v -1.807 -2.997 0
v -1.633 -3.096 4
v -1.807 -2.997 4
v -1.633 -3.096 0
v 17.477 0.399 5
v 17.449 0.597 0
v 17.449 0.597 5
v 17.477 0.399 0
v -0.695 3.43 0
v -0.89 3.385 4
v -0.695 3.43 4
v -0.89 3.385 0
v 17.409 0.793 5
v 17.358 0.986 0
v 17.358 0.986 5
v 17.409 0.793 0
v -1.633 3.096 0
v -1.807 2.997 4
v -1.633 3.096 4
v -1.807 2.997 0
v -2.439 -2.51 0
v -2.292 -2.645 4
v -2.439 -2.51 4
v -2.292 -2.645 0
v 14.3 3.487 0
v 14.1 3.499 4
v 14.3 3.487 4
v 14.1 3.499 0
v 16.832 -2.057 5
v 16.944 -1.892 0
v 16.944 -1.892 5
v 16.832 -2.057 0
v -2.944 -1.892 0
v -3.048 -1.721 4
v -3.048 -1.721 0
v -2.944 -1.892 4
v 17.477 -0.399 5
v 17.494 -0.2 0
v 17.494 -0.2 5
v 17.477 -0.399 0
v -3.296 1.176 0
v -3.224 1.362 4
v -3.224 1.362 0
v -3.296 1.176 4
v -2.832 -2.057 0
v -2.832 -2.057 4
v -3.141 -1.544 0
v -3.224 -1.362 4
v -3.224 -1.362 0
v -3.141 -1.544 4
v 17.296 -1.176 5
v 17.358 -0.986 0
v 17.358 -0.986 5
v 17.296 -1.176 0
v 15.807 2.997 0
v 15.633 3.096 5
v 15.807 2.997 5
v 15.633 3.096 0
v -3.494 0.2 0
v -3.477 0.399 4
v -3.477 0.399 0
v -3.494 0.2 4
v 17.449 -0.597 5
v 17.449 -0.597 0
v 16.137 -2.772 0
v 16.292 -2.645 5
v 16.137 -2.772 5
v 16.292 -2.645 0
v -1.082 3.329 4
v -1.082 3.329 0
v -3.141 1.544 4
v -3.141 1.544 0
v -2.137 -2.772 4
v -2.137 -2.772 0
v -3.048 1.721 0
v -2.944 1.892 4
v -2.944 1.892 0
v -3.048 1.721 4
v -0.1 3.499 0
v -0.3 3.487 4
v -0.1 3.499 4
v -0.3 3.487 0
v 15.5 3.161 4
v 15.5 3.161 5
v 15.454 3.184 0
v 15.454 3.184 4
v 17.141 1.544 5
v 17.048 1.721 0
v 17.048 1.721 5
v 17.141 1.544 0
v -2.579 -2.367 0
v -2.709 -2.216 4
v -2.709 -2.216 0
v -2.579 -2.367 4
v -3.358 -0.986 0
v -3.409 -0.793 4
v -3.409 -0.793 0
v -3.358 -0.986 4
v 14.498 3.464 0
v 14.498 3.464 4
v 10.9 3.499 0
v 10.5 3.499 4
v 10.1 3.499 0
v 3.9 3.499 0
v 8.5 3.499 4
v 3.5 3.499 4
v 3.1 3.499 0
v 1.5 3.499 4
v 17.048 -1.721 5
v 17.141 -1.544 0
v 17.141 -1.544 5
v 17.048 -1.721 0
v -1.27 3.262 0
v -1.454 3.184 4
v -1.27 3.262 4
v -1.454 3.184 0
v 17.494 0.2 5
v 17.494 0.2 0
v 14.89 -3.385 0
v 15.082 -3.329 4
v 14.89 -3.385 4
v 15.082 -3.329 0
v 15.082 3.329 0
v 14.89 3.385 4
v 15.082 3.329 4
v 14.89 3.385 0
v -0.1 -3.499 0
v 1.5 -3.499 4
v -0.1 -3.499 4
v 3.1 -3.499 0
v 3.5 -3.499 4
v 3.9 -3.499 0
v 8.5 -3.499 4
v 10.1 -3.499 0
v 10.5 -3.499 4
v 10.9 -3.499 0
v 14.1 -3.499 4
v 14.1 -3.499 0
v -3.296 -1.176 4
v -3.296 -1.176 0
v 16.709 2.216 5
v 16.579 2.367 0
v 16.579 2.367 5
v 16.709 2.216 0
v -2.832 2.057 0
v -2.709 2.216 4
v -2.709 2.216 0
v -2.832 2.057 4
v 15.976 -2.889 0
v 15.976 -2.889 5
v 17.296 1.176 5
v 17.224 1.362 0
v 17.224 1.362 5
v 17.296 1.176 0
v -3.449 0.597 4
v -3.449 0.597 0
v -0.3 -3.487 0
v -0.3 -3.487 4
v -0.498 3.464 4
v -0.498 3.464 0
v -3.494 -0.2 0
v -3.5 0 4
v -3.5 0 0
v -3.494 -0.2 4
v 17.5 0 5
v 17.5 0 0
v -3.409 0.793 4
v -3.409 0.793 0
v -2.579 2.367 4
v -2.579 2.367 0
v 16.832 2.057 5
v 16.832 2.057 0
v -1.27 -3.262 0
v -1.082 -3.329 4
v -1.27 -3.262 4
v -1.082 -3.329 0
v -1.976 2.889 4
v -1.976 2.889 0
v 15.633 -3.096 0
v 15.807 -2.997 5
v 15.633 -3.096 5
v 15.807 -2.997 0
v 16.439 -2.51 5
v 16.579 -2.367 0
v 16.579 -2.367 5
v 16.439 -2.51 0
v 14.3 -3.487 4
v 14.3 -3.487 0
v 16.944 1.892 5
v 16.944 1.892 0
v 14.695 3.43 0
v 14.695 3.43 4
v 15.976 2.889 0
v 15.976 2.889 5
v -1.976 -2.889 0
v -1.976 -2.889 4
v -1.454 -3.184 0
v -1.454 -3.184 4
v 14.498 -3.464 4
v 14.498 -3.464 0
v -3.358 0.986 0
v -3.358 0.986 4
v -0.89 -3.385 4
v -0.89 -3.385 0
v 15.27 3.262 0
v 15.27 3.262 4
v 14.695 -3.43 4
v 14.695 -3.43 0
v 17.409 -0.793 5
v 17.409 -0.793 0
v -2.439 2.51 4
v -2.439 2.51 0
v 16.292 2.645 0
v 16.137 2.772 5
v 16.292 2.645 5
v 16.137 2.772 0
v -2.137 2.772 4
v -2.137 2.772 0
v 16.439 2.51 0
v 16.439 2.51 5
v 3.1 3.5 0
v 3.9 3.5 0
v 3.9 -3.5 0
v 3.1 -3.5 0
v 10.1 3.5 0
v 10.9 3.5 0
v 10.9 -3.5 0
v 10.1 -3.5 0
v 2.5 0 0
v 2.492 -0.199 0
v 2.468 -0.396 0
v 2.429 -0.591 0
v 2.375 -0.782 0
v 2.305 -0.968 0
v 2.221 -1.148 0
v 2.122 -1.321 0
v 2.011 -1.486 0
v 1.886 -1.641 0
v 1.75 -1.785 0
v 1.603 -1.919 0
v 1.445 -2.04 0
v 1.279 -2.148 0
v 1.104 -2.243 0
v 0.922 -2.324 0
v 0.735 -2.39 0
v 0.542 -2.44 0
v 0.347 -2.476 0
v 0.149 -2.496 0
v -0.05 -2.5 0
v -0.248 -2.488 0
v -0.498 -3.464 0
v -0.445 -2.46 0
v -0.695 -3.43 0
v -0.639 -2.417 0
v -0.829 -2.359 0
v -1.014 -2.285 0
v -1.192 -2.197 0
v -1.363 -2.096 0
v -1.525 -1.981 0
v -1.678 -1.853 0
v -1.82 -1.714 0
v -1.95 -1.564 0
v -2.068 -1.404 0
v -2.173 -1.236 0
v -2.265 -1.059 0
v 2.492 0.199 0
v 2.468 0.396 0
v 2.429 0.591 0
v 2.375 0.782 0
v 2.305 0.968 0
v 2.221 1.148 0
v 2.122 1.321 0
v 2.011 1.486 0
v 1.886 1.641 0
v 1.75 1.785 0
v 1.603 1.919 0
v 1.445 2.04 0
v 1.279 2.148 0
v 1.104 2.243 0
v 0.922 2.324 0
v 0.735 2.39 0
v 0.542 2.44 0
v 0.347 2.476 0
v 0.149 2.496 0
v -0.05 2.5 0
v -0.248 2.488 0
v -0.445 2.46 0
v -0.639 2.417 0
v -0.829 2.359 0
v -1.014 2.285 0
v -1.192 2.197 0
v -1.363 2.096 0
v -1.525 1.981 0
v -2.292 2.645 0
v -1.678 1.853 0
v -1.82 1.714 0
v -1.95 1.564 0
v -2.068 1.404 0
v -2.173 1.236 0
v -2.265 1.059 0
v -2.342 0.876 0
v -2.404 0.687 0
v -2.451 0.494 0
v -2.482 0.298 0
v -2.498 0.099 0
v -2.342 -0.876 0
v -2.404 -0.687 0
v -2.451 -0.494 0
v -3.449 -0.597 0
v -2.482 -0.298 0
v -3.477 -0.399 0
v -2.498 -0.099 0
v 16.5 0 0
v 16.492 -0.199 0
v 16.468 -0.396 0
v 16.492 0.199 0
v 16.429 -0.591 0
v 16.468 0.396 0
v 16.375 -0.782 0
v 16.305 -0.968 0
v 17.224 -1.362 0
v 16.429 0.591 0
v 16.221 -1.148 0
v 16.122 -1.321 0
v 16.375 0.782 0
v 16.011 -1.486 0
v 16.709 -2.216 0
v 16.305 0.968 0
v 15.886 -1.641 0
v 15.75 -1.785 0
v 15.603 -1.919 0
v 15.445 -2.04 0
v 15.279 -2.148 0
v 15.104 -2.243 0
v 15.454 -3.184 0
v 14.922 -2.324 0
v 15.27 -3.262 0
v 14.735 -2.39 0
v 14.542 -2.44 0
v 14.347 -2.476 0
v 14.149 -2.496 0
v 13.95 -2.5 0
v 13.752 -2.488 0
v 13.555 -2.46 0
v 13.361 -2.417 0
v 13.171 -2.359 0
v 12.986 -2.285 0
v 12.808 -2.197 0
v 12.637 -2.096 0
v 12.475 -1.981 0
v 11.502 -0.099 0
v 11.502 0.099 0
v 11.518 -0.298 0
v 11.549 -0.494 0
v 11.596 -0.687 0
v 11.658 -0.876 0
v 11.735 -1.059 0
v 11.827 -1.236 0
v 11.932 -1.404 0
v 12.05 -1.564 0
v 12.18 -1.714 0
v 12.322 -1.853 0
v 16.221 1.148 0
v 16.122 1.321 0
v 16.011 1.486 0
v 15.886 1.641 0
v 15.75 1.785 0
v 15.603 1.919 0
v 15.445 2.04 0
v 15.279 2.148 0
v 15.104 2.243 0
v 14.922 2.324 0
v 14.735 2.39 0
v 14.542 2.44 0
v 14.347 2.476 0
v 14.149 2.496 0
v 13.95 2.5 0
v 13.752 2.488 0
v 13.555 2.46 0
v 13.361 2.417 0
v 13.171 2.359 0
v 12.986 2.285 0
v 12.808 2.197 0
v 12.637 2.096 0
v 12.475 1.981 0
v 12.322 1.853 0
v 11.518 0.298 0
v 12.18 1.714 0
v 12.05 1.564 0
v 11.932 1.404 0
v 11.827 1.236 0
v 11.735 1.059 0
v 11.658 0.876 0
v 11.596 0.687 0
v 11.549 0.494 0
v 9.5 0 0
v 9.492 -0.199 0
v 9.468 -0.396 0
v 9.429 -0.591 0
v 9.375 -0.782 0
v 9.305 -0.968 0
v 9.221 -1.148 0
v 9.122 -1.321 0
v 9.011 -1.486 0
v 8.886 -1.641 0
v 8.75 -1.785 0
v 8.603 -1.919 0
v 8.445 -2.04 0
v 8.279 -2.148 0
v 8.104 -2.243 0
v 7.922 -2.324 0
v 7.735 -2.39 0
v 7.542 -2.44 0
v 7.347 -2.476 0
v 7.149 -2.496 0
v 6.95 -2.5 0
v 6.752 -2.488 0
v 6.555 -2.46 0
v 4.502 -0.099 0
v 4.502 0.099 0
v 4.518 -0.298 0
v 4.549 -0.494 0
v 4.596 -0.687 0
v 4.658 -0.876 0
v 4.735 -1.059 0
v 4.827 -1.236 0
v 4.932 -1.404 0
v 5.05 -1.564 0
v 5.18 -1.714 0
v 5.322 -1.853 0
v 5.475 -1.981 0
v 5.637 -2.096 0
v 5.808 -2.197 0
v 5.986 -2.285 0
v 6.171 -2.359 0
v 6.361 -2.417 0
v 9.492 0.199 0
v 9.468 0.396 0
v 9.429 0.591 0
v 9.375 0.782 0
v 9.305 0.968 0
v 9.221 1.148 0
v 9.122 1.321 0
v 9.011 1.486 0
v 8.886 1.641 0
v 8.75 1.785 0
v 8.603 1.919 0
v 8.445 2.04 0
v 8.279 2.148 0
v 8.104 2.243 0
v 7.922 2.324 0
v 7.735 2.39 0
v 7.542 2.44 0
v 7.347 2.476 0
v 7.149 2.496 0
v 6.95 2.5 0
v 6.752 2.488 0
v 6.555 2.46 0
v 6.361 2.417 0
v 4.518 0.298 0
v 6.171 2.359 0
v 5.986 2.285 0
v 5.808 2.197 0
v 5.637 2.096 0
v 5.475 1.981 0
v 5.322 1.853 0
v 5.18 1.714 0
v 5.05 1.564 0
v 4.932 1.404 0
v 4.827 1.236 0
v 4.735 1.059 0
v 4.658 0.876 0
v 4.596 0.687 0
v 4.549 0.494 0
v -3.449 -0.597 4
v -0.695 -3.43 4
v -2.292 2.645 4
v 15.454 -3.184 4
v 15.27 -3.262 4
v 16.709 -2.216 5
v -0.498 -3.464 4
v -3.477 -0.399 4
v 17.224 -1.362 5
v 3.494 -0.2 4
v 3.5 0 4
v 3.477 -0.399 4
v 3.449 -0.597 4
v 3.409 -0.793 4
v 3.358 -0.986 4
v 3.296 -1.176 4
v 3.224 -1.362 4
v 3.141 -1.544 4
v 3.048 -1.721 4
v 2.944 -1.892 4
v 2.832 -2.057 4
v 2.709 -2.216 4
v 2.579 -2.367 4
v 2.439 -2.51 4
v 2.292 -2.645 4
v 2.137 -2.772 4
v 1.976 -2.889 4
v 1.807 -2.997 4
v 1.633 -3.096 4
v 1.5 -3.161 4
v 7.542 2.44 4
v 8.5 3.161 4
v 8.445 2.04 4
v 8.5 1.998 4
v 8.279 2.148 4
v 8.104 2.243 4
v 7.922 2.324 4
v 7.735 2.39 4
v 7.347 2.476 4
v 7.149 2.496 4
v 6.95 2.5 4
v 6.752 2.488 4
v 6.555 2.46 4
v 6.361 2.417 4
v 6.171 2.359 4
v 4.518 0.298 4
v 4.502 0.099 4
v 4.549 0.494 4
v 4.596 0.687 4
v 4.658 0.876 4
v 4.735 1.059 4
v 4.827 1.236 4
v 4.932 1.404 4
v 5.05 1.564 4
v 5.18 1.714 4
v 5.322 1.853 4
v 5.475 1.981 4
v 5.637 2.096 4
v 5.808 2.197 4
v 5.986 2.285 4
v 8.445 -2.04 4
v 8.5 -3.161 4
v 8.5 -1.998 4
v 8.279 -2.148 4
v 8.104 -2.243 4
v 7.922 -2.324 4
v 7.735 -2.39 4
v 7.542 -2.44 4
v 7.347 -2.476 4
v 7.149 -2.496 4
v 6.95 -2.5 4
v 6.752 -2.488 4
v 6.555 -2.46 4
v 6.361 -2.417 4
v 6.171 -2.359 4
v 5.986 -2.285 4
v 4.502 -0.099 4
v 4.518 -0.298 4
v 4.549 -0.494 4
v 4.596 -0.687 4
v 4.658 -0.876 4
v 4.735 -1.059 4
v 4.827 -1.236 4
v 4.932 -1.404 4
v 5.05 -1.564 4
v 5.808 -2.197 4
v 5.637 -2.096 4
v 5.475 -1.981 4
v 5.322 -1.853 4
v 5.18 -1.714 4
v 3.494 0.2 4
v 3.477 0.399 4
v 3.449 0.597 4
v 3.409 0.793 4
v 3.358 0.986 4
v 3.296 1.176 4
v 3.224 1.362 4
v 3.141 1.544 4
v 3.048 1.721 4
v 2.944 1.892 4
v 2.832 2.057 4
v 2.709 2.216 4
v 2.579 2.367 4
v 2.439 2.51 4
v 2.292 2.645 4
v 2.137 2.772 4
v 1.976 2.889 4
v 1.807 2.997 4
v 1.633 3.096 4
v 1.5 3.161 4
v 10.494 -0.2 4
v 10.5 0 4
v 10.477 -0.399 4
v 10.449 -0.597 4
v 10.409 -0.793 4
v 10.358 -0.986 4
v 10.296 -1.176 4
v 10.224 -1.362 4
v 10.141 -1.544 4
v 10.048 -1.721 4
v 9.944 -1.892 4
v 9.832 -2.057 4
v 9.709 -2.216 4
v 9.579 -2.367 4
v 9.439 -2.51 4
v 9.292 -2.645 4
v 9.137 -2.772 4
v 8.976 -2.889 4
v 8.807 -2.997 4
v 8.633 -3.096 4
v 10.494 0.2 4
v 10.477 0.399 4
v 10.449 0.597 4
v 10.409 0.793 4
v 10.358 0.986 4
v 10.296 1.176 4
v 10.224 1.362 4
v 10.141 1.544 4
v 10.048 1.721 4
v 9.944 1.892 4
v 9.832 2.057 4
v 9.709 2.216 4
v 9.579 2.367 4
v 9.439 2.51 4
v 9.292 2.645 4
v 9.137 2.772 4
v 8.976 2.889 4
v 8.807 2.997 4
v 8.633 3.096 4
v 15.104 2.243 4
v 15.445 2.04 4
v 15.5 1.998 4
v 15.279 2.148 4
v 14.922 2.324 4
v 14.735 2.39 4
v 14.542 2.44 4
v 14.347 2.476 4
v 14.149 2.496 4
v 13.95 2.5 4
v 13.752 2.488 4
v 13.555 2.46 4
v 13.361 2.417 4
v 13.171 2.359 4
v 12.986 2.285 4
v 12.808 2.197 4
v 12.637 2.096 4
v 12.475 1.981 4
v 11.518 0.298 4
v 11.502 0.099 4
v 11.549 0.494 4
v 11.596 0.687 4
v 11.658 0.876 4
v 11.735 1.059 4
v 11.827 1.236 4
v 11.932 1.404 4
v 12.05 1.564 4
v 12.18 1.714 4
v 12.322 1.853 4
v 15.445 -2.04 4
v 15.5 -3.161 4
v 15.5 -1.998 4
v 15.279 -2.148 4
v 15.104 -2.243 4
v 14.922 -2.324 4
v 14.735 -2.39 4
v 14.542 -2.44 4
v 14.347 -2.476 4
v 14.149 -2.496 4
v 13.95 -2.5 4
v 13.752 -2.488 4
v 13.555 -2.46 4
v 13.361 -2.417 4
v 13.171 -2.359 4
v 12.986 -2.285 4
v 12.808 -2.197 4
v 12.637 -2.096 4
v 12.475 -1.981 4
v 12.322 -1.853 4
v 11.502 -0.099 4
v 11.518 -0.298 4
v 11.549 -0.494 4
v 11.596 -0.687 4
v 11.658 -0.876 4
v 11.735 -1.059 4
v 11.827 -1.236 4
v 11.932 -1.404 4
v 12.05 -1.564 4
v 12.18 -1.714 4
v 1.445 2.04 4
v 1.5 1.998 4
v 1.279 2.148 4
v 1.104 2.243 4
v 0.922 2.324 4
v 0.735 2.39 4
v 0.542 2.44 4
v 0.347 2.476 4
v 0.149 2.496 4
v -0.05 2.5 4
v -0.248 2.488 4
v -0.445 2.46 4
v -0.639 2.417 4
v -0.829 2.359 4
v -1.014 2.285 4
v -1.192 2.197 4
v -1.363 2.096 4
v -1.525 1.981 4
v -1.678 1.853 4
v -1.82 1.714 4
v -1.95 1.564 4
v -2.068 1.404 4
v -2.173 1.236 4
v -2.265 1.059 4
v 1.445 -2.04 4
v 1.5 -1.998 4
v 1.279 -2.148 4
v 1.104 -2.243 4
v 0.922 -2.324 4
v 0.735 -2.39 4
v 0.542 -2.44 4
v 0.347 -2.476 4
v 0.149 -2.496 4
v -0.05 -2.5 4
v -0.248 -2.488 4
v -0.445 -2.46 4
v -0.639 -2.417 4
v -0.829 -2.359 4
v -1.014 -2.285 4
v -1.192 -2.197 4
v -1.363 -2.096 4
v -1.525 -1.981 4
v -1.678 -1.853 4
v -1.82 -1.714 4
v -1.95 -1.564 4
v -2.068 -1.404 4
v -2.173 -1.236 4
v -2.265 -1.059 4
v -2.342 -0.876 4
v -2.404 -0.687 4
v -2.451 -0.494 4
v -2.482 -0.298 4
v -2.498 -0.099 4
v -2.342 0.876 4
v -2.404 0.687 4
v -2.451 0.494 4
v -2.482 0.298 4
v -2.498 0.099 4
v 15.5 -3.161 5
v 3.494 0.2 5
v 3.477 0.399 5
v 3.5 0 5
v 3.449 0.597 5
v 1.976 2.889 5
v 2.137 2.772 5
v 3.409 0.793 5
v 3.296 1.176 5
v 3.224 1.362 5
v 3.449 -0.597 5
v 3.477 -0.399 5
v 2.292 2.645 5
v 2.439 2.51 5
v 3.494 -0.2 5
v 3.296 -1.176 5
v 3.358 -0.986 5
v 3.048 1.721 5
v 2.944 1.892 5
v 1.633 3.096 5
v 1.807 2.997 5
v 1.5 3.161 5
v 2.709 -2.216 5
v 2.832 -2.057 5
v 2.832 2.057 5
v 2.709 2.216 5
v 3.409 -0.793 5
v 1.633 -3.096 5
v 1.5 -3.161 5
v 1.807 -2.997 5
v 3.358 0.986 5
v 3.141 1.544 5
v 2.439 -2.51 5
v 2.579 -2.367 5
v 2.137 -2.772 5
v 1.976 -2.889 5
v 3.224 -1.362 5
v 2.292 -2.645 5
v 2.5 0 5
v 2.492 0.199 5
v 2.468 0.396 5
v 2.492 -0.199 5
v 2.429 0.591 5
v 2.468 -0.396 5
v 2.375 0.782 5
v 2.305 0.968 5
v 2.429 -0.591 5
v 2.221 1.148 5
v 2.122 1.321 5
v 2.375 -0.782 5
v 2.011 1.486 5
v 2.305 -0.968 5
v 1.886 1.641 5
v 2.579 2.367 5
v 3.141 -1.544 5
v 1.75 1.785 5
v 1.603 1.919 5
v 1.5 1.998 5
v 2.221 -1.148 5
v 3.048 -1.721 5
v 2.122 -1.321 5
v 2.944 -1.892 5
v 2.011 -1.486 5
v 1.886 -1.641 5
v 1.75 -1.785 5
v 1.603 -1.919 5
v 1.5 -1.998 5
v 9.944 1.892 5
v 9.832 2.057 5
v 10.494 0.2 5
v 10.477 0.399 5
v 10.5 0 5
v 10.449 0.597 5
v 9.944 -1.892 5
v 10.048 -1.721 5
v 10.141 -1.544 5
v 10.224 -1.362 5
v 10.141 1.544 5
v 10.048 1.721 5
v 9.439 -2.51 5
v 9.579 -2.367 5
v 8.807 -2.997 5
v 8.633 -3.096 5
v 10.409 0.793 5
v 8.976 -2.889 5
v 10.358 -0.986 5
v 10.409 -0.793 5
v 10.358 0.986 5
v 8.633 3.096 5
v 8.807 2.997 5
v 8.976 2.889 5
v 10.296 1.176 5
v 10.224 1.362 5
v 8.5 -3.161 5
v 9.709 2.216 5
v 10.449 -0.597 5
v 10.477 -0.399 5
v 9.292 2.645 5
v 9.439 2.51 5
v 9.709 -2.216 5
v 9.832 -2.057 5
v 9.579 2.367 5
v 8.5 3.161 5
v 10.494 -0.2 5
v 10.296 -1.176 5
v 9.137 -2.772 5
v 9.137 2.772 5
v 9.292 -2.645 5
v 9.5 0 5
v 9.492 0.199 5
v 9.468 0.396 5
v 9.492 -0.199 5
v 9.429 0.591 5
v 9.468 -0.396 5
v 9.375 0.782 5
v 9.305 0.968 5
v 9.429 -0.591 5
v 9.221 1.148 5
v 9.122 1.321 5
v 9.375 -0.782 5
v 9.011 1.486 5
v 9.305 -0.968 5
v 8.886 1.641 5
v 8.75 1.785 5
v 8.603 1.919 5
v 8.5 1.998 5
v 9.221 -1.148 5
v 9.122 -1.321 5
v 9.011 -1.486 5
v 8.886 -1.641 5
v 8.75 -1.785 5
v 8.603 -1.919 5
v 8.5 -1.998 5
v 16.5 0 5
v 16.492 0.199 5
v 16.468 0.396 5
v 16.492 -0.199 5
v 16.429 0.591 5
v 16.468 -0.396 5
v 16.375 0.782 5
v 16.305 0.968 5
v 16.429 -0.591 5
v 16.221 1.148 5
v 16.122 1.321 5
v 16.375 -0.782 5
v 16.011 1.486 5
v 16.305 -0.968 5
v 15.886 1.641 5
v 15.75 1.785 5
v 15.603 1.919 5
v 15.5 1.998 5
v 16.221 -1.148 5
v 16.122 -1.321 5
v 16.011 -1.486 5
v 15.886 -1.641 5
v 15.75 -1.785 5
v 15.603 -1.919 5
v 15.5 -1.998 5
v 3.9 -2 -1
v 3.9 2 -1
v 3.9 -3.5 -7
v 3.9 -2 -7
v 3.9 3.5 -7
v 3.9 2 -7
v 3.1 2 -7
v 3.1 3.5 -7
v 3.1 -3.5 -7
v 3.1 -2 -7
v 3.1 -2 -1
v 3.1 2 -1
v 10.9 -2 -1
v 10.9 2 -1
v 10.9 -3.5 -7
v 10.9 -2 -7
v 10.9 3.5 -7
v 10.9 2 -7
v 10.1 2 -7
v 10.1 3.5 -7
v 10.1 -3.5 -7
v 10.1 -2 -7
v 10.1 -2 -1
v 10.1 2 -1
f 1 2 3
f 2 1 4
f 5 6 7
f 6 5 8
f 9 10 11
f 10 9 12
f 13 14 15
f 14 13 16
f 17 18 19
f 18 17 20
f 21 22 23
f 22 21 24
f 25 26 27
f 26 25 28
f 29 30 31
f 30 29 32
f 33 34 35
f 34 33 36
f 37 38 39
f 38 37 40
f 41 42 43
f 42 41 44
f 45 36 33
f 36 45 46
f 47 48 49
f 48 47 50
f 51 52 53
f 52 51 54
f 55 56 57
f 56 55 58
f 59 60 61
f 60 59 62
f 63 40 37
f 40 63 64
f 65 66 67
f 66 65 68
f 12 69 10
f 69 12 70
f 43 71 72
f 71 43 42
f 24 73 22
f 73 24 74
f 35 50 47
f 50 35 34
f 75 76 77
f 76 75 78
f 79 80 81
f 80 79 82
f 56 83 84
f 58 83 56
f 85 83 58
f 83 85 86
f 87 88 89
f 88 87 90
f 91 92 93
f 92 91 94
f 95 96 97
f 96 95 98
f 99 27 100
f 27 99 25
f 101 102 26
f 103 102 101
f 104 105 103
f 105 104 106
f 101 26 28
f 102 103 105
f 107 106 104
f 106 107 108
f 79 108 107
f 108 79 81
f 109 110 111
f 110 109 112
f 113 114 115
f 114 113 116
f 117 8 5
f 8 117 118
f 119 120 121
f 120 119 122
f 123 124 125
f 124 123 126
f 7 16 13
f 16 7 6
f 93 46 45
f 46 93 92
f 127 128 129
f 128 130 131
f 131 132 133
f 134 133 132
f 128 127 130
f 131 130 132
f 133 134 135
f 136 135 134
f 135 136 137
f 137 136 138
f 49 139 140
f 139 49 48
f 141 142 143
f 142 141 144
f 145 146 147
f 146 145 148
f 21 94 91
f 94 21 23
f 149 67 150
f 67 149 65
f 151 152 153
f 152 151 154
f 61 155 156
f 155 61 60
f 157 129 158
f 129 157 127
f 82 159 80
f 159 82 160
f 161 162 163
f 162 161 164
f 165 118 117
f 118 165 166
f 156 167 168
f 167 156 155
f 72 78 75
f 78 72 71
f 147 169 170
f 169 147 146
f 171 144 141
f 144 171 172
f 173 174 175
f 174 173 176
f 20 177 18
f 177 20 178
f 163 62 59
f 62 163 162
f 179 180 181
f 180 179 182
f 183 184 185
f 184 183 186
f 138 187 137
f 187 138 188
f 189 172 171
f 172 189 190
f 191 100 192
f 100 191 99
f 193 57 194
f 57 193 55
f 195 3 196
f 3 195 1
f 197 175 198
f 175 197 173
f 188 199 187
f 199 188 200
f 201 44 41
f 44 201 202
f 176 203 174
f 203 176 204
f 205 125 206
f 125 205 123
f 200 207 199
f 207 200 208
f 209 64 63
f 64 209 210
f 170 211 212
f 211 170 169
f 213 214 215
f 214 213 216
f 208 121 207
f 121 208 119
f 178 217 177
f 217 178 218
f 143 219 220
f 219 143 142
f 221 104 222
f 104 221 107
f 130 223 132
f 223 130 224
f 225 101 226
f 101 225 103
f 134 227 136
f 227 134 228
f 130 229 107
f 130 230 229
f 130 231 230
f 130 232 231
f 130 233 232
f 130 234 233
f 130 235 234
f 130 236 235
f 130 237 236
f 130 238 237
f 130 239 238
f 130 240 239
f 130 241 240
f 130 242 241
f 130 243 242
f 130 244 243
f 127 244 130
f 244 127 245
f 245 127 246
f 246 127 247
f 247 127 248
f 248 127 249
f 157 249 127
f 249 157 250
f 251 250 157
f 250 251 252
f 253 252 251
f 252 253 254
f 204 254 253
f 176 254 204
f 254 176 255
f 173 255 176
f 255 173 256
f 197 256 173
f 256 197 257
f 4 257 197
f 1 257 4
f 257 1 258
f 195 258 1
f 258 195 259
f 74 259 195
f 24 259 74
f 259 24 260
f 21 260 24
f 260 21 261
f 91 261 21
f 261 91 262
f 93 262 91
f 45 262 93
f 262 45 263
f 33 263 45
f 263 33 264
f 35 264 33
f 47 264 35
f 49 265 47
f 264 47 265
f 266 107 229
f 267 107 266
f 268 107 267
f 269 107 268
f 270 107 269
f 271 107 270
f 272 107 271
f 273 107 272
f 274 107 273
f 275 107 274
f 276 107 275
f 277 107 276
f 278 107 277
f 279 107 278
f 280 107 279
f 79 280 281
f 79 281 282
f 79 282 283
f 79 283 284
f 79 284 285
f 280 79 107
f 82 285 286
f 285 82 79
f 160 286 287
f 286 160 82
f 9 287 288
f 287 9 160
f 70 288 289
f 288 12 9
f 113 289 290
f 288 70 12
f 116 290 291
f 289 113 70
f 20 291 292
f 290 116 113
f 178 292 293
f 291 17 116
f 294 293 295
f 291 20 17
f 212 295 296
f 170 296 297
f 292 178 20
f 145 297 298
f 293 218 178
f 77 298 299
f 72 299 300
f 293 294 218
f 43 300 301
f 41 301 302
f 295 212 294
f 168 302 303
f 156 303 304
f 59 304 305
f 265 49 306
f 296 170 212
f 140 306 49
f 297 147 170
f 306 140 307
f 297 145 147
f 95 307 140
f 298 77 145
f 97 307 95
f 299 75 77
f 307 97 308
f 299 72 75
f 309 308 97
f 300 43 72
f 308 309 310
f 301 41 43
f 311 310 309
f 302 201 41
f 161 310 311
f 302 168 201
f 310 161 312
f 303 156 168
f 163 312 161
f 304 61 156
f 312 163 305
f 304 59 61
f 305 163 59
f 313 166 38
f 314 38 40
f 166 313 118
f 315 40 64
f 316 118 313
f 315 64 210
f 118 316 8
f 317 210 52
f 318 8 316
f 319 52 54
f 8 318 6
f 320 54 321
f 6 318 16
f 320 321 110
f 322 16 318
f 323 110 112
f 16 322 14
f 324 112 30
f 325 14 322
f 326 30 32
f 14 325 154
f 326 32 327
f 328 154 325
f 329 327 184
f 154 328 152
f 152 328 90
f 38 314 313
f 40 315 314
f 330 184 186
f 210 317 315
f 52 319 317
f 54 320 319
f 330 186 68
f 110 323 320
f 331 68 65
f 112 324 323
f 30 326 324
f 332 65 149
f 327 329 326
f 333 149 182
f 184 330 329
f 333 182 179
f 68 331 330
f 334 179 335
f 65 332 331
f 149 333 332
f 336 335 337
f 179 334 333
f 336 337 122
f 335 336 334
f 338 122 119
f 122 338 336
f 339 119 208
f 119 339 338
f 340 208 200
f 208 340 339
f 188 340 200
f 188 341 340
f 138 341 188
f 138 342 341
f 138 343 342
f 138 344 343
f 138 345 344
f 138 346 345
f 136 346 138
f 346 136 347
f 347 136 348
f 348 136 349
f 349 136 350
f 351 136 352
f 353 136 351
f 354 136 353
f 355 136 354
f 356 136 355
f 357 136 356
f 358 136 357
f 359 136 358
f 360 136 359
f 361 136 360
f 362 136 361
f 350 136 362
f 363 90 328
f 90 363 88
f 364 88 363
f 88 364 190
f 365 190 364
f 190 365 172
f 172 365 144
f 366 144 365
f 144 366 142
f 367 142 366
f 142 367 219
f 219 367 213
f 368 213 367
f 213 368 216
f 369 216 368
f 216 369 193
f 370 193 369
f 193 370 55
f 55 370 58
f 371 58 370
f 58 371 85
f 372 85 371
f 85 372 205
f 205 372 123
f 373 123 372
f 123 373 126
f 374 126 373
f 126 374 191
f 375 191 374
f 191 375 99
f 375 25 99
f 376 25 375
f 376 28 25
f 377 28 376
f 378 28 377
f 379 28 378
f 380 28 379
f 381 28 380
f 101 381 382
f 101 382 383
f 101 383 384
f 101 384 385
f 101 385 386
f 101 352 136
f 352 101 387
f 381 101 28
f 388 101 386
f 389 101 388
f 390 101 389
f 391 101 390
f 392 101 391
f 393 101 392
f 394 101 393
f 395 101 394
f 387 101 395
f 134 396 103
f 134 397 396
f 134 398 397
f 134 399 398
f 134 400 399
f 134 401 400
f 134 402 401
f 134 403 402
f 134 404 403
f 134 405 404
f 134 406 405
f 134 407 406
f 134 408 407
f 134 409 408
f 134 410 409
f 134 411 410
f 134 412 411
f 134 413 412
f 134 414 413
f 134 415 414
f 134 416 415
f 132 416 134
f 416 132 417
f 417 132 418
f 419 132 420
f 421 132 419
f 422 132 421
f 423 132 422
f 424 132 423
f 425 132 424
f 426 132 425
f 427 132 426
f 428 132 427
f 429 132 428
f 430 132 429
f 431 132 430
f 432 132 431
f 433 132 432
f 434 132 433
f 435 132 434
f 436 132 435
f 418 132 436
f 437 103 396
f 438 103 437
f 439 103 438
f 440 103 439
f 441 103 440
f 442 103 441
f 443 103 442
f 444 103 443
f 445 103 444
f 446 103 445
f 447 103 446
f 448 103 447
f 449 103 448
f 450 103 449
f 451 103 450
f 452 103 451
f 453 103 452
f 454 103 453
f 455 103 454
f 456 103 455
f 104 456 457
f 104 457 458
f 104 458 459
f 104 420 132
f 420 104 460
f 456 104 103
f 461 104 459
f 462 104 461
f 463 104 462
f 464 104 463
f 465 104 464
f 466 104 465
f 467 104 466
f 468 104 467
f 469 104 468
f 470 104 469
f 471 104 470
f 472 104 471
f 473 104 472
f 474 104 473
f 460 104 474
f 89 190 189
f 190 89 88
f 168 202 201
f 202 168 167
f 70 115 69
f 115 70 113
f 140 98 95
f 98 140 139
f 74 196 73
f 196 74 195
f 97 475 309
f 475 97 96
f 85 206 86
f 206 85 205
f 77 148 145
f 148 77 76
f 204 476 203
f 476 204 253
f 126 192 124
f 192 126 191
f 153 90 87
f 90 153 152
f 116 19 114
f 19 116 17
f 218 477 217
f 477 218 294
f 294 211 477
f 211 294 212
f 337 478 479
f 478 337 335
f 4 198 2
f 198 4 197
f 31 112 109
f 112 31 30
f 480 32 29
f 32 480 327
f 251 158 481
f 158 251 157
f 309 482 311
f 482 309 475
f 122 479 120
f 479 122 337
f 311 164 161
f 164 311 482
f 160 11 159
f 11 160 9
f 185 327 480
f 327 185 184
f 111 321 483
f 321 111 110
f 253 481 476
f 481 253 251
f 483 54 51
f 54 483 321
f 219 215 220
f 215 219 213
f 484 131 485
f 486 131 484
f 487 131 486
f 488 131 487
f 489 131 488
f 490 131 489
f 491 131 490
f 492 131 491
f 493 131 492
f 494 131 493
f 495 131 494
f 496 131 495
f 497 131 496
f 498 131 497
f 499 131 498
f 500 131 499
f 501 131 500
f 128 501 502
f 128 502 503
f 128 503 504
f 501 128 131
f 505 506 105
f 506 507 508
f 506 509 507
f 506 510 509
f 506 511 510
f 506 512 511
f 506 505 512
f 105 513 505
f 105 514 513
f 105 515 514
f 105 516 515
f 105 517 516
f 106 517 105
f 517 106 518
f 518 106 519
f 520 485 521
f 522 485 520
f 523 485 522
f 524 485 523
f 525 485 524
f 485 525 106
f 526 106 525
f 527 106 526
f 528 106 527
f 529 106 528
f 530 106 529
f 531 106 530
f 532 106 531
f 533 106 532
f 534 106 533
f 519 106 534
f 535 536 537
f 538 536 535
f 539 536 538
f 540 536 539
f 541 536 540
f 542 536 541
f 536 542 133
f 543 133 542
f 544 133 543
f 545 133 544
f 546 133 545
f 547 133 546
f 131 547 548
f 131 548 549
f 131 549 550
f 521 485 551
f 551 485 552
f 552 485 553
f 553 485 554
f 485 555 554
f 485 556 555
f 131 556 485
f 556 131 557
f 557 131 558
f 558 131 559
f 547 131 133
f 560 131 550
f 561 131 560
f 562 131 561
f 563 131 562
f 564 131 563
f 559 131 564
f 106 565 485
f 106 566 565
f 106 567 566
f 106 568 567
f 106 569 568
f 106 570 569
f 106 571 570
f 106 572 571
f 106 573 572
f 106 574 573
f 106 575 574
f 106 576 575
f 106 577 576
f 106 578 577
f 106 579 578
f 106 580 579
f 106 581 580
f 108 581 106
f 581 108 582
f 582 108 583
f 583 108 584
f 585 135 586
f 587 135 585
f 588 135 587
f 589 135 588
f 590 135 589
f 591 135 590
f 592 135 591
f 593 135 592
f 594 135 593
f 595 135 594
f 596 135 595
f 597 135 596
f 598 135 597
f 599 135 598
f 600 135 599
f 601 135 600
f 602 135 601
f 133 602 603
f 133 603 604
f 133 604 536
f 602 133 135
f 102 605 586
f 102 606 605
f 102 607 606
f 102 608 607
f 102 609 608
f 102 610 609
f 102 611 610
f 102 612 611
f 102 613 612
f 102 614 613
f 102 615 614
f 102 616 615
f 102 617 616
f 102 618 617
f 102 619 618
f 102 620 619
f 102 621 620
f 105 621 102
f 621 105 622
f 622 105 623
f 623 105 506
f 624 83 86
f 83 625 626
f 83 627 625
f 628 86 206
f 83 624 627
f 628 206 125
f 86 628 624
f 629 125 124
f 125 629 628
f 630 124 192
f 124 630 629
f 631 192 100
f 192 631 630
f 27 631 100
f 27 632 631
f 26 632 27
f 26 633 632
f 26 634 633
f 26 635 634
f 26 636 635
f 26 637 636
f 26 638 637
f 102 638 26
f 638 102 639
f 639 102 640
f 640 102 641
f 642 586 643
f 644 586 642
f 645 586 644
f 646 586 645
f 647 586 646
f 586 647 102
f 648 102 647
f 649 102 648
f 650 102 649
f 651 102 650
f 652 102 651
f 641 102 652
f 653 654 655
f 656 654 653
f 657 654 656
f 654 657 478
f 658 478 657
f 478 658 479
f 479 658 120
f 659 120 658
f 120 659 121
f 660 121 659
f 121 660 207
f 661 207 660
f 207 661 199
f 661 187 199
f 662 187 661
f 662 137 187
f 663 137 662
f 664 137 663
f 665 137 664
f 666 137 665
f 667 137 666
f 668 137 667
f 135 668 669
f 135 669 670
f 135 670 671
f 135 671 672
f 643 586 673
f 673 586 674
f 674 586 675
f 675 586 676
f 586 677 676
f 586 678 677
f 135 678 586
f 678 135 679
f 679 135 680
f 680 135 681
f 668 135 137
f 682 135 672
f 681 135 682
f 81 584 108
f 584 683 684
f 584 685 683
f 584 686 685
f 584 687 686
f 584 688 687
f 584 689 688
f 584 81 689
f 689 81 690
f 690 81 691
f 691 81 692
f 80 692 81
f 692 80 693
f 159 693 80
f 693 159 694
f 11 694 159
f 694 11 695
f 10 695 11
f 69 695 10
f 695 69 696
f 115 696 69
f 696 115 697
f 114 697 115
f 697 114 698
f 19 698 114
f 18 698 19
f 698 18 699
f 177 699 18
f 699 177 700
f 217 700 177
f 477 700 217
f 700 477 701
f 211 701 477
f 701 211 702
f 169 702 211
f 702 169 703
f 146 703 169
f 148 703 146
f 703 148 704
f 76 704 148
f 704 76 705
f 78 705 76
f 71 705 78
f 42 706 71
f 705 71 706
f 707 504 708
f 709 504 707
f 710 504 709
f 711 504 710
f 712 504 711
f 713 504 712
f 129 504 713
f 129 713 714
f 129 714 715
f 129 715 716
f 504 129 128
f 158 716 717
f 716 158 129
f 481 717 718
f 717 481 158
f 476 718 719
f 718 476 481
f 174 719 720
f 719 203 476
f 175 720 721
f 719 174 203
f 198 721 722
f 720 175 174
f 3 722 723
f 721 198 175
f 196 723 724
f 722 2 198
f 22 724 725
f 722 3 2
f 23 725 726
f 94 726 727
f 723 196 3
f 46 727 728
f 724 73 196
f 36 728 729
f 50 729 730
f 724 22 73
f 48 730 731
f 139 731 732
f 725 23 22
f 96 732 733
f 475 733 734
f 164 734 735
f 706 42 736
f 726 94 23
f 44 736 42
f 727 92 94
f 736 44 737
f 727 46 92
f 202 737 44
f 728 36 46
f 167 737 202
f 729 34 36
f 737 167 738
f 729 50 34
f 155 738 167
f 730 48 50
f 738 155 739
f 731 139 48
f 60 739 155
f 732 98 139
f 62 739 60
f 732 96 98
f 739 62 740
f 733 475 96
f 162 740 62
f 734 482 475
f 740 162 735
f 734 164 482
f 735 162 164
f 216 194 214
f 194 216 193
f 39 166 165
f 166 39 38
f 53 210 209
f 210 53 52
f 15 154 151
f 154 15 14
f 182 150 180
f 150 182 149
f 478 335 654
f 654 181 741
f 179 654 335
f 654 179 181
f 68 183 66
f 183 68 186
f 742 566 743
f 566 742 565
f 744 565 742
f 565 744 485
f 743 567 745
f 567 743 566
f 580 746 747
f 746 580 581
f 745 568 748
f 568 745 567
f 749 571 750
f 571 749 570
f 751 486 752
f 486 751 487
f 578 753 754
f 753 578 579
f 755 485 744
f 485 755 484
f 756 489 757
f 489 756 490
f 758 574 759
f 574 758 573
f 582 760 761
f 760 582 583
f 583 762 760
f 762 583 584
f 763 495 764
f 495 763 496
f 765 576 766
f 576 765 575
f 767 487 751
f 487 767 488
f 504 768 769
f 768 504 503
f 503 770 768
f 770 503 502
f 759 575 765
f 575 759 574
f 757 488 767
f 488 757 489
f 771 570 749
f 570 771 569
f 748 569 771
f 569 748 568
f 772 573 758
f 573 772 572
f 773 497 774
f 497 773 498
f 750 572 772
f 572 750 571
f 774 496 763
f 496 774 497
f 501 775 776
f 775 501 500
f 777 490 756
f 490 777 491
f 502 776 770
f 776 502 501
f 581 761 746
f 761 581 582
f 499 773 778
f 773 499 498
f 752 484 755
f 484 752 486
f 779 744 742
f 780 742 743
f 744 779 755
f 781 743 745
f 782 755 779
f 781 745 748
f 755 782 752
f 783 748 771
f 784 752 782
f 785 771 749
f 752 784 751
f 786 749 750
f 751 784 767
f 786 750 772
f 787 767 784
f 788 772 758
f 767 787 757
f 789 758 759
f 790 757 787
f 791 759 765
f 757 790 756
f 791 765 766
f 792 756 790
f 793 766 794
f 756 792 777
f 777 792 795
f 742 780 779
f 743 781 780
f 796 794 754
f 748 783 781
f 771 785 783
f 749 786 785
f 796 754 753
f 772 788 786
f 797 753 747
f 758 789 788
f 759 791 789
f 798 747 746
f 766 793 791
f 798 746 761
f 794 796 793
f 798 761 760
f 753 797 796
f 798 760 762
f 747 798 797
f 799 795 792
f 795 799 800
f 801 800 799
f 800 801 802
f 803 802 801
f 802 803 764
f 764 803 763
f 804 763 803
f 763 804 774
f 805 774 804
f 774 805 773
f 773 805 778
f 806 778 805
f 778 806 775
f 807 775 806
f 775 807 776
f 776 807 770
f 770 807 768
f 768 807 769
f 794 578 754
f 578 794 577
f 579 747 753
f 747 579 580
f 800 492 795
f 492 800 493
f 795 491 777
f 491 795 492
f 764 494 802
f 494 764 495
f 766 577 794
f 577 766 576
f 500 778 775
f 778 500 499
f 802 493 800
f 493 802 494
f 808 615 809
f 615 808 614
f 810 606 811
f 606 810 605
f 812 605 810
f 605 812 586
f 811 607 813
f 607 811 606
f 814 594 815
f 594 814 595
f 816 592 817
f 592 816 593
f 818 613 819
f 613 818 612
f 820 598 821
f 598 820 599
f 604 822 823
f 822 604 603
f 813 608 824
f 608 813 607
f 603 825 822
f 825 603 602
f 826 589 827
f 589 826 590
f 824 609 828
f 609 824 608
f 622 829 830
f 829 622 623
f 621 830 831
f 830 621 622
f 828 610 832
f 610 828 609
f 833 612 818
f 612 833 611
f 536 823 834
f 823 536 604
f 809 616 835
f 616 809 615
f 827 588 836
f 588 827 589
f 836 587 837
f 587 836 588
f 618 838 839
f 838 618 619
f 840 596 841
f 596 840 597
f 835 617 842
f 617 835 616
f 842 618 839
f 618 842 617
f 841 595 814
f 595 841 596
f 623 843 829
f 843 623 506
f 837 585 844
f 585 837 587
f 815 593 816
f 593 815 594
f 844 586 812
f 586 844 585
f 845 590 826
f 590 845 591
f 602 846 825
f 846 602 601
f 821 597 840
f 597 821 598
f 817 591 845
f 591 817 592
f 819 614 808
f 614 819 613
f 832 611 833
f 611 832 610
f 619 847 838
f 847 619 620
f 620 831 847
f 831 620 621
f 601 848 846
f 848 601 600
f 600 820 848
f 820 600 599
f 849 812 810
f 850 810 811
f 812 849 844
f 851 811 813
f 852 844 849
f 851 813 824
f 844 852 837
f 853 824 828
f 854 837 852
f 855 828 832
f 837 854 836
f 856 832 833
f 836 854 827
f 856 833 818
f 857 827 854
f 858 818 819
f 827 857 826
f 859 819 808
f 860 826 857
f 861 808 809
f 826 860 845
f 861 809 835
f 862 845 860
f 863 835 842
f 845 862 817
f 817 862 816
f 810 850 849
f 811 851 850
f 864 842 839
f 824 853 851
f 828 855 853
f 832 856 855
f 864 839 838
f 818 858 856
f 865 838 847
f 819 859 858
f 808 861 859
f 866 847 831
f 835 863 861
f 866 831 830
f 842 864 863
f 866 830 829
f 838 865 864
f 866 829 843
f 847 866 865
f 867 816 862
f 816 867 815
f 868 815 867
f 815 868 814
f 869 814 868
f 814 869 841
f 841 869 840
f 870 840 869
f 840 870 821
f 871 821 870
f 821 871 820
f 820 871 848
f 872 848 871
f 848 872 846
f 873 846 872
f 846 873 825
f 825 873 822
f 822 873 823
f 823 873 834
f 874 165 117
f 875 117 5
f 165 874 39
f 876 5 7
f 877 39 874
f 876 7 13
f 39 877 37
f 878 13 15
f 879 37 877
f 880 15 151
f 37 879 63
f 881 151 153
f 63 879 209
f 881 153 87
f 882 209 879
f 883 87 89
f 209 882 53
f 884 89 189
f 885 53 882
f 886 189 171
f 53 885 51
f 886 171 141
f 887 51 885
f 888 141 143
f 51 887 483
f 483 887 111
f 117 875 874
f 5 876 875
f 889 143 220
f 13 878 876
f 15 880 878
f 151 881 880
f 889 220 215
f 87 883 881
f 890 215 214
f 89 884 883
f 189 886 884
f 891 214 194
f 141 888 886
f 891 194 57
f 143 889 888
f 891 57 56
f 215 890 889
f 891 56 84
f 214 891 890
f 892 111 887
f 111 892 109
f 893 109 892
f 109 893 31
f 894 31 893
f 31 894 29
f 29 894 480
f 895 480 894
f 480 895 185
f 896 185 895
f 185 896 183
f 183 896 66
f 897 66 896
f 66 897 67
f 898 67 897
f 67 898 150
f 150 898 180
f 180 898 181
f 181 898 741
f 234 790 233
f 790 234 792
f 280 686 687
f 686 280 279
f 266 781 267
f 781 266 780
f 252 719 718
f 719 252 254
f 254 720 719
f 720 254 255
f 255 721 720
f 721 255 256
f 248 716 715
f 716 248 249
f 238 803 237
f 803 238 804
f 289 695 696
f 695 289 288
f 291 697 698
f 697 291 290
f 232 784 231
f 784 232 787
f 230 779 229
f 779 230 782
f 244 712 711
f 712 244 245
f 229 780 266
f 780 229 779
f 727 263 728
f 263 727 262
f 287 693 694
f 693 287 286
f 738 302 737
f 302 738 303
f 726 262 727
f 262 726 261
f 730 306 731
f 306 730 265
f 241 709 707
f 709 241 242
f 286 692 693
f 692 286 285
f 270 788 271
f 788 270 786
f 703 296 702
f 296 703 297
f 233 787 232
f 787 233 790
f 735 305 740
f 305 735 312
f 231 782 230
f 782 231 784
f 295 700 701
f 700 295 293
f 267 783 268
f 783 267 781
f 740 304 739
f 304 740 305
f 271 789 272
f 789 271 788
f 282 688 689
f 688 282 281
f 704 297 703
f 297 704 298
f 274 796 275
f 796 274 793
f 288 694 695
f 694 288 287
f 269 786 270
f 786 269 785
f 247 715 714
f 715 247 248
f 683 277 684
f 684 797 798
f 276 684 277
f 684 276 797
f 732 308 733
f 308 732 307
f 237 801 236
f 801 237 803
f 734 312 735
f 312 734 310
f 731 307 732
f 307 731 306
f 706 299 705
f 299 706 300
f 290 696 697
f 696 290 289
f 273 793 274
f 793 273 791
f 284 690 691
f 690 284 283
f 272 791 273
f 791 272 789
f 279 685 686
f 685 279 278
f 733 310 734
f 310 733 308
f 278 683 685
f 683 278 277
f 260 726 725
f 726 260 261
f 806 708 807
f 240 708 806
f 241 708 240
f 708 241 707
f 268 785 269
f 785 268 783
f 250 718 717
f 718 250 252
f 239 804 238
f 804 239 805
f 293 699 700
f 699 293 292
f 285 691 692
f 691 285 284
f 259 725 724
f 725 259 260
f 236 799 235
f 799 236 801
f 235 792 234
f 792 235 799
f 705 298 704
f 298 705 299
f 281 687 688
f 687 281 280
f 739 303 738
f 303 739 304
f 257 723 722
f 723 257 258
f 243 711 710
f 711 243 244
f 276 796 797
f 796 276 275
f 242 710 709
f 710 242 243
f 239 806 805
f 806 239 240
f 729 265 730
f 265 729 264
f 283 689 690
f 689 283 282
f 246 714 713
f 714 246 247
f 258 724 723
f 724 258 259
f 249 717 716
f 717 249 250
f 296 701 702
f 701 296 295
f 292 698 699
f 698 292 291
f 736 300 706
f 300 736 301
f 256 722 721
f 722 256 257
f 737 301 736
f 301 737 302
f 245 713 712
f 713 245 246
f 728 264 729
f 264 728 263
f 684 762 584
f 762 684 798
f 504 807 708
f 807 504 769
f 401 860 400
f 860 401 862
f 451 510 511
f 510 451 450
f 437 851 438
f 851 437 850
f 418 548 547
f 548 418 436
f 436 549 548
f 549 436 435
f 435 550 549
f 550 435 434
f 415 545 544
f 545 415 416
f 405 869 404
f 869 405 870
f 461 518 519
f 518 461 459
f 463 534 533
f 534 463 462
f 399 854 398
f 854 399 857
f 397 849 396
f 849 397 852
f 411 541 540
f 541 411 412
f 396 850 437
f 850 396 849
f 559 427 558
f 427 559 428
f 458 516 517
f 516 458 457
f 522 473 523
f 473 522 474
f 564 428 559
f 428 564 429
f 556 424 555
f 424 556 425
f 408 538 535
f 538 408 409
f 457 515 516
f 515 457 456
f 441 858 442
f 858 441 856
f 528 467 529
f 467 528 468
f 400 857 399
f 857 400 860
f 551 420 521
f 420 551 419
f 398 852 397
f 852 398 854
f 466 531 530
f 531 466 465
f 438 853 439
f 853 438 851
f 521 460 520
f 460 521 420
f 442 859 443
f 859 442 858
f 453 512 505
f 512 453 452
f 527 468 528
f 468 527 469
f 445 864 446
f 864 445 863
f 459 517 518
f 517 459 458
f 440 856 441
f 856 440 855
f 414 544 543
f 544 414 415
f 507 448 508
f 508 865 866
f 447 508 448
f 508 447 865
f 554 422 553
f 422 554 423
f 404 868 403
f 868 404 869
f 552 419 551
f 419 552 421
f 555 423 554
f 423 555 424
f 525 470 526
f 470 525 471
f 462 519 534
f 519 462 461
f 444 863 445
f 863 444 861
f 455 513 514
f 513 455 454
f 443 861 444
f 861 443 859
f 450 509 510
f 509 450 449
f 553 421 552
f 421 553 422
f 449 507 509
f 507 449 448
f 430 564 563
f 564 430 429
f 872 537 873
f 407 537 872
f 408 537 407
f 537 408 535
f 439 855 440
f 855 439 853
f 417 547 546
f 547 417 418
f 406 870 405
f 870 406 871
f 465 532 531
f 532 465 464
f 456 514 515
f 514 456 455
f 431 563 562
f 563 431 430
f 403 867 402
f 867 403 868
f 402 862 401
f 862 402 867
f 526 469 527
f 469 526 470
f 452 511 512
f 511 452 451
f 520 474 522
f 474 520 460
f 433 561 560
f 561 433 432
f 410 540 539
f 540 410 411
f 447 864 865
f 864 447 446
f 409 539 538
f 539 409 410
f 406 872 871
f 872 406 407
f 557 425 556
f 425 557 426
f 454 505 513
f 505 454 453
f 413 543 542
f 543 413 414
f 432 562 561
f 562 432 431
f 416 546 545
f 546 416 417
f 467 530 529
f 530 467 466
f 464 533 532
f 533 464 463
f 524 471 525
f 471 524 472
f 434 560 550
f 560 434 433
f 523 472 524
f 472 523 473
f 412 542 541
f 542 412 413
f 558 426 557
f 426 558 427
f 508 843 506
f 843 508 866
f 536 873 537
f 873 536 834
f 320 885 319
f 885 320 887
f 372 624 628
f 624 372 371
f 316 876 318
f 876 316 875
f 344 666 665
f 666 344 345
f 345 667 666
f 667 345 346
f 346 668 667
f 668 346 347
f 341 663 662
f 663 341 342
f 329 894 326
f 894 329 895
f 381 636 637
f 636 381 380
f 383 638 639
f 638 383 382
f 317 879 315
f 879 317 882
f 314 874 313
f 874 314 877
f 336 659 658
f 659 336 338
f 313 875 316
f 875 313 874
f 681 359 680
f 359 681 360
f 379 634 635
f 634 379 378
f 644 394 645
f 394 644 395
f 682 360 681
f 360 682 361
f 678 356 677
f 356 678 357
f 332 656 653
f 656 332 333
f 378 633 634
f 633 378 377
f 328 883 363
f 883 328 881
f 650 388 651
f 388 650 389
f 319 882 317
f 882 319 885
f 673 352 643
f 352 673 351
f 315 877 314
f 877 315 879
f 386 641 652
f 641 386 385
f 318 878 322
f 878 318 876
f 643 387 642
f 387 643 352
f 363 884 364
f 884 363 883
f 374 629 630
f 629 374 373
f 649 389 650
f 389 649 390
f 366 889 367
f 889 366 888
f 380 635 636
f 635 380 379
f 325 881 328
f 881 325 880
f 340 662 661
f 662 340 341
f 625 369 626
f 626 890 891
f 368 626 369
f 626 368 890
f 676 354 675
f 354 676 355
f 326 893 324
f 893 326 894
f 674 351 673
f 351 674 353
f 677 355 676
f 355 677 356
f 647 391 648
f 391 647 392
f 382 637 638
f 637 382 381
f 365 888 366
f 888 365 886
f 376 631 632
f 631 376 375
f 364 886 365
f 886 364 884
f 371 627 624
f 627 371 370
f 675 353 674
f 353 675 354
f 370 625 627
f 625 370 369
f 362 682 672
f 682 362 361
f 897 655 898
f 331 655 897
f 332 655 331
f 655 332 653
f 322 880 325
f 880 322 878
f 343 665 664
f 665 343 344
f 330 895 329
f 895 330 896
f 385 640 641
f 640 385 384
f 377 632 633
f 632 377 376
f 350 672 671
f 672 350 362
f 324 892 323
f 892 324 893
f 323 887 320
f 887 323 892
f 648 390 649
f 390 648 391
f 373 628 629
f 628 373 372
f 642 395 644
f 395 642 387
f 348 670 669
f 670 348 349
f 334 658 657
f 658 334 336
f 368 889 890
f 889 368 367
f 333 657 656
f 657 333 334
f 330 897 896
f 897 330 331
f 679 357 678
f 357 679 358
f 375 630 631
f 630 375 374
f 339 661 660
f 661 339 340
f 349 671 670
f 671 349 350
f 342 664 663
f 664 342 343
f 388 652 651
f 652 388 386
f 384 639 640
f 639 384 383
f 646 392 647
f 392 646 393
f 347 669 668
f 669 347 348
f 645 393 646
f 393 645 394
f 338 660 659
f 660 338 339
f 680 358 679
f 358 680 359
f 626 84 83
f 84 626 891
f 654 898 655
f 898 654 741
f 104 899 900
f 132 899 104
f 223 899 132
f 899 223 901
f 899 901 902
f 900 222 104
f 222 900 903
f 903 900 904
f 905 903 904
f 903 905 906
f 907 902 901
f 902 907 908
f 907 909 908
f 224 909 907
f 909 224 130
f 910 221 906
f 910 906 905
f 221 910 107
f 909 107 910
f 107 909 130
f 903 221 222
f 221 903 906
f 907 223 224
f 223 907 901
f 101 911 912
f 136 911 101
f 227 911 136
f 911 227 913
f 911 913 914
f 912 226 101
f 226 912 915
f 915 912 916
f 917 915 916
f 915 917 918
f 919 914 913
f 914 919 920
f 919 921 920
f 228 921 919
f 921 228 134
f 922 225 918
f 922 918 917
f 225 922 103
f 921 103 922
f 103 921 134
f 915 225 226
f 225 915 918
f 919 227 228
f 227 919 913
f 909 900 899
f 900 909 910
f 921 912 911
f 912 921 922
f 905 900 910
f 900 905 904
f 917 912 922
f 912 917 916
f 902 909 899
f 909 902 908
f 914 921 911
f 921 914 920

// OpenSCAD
$fs=0.2; // default 2
$fa=3; // default 12


//pole();
light_holder();
module light_holder() {
  module single() {
    cylinder(d=7, h=5);
  }
  module single_hole() {
    cylinder(d=5, h=30, center=true);
    translate([-1,0,54]) cube([5,100,100],true);
  }
  difference() {
    union() {
      hull() {
        translate([0,0,0]) cylinder(d=7, h=4);;
        translate([14,0,0]) cylinder(d=7, h=4);;
      }
      translate([0,0,0]) single();
      translate([7,0,0]) single();
      translate([14,0,0]) single();
    }
    union() {
      translate([0,0,0]) single_hole();
      translate([7,0,0]) single_hole();
      translate([14,0,0]) single_hole();
    }
  }
  difference() {
    union() {
      translate([3.5,0,-3.5]) cube([0.8,7,7],true);
      translate([10.5,0,-3.5]) cube([0.8,7,7],true);    
    }
    translate([0,0,-6]) cube([100,4,10],true);
  }
  
}

module head() {
  //cube([10,12,24],true);
  module outer() {
    hull() {
      translate([0,0,0]) cylinder(d=10, h=12);
      translate([14,0,0]) cylinder(d=10, h=12);
    }
  }
  module inner() {
    translate([0,0,1]) hull() {
      translate([0,0,0]) cylinder(d=7, h=12);
      translate([14,0,0]) cylinder(d=7, h=12);
    }
  }
  rotate([0,-90,0]) difference() {
    outer();
    inner();
  }
}
module pole() {
  
  difference() {
    union() {
      translate([0,0,-6]) cylinder(d=10,h=6);
      translate([0,0,0]) cylinder(d1=14,d2=6,h=10);
      translate([0,0,10]) cylinder(d=6,h=60);
      translate([5,0,73]) head();
    }
    cylinder(d=4,h=170,center=true);
  }
}
